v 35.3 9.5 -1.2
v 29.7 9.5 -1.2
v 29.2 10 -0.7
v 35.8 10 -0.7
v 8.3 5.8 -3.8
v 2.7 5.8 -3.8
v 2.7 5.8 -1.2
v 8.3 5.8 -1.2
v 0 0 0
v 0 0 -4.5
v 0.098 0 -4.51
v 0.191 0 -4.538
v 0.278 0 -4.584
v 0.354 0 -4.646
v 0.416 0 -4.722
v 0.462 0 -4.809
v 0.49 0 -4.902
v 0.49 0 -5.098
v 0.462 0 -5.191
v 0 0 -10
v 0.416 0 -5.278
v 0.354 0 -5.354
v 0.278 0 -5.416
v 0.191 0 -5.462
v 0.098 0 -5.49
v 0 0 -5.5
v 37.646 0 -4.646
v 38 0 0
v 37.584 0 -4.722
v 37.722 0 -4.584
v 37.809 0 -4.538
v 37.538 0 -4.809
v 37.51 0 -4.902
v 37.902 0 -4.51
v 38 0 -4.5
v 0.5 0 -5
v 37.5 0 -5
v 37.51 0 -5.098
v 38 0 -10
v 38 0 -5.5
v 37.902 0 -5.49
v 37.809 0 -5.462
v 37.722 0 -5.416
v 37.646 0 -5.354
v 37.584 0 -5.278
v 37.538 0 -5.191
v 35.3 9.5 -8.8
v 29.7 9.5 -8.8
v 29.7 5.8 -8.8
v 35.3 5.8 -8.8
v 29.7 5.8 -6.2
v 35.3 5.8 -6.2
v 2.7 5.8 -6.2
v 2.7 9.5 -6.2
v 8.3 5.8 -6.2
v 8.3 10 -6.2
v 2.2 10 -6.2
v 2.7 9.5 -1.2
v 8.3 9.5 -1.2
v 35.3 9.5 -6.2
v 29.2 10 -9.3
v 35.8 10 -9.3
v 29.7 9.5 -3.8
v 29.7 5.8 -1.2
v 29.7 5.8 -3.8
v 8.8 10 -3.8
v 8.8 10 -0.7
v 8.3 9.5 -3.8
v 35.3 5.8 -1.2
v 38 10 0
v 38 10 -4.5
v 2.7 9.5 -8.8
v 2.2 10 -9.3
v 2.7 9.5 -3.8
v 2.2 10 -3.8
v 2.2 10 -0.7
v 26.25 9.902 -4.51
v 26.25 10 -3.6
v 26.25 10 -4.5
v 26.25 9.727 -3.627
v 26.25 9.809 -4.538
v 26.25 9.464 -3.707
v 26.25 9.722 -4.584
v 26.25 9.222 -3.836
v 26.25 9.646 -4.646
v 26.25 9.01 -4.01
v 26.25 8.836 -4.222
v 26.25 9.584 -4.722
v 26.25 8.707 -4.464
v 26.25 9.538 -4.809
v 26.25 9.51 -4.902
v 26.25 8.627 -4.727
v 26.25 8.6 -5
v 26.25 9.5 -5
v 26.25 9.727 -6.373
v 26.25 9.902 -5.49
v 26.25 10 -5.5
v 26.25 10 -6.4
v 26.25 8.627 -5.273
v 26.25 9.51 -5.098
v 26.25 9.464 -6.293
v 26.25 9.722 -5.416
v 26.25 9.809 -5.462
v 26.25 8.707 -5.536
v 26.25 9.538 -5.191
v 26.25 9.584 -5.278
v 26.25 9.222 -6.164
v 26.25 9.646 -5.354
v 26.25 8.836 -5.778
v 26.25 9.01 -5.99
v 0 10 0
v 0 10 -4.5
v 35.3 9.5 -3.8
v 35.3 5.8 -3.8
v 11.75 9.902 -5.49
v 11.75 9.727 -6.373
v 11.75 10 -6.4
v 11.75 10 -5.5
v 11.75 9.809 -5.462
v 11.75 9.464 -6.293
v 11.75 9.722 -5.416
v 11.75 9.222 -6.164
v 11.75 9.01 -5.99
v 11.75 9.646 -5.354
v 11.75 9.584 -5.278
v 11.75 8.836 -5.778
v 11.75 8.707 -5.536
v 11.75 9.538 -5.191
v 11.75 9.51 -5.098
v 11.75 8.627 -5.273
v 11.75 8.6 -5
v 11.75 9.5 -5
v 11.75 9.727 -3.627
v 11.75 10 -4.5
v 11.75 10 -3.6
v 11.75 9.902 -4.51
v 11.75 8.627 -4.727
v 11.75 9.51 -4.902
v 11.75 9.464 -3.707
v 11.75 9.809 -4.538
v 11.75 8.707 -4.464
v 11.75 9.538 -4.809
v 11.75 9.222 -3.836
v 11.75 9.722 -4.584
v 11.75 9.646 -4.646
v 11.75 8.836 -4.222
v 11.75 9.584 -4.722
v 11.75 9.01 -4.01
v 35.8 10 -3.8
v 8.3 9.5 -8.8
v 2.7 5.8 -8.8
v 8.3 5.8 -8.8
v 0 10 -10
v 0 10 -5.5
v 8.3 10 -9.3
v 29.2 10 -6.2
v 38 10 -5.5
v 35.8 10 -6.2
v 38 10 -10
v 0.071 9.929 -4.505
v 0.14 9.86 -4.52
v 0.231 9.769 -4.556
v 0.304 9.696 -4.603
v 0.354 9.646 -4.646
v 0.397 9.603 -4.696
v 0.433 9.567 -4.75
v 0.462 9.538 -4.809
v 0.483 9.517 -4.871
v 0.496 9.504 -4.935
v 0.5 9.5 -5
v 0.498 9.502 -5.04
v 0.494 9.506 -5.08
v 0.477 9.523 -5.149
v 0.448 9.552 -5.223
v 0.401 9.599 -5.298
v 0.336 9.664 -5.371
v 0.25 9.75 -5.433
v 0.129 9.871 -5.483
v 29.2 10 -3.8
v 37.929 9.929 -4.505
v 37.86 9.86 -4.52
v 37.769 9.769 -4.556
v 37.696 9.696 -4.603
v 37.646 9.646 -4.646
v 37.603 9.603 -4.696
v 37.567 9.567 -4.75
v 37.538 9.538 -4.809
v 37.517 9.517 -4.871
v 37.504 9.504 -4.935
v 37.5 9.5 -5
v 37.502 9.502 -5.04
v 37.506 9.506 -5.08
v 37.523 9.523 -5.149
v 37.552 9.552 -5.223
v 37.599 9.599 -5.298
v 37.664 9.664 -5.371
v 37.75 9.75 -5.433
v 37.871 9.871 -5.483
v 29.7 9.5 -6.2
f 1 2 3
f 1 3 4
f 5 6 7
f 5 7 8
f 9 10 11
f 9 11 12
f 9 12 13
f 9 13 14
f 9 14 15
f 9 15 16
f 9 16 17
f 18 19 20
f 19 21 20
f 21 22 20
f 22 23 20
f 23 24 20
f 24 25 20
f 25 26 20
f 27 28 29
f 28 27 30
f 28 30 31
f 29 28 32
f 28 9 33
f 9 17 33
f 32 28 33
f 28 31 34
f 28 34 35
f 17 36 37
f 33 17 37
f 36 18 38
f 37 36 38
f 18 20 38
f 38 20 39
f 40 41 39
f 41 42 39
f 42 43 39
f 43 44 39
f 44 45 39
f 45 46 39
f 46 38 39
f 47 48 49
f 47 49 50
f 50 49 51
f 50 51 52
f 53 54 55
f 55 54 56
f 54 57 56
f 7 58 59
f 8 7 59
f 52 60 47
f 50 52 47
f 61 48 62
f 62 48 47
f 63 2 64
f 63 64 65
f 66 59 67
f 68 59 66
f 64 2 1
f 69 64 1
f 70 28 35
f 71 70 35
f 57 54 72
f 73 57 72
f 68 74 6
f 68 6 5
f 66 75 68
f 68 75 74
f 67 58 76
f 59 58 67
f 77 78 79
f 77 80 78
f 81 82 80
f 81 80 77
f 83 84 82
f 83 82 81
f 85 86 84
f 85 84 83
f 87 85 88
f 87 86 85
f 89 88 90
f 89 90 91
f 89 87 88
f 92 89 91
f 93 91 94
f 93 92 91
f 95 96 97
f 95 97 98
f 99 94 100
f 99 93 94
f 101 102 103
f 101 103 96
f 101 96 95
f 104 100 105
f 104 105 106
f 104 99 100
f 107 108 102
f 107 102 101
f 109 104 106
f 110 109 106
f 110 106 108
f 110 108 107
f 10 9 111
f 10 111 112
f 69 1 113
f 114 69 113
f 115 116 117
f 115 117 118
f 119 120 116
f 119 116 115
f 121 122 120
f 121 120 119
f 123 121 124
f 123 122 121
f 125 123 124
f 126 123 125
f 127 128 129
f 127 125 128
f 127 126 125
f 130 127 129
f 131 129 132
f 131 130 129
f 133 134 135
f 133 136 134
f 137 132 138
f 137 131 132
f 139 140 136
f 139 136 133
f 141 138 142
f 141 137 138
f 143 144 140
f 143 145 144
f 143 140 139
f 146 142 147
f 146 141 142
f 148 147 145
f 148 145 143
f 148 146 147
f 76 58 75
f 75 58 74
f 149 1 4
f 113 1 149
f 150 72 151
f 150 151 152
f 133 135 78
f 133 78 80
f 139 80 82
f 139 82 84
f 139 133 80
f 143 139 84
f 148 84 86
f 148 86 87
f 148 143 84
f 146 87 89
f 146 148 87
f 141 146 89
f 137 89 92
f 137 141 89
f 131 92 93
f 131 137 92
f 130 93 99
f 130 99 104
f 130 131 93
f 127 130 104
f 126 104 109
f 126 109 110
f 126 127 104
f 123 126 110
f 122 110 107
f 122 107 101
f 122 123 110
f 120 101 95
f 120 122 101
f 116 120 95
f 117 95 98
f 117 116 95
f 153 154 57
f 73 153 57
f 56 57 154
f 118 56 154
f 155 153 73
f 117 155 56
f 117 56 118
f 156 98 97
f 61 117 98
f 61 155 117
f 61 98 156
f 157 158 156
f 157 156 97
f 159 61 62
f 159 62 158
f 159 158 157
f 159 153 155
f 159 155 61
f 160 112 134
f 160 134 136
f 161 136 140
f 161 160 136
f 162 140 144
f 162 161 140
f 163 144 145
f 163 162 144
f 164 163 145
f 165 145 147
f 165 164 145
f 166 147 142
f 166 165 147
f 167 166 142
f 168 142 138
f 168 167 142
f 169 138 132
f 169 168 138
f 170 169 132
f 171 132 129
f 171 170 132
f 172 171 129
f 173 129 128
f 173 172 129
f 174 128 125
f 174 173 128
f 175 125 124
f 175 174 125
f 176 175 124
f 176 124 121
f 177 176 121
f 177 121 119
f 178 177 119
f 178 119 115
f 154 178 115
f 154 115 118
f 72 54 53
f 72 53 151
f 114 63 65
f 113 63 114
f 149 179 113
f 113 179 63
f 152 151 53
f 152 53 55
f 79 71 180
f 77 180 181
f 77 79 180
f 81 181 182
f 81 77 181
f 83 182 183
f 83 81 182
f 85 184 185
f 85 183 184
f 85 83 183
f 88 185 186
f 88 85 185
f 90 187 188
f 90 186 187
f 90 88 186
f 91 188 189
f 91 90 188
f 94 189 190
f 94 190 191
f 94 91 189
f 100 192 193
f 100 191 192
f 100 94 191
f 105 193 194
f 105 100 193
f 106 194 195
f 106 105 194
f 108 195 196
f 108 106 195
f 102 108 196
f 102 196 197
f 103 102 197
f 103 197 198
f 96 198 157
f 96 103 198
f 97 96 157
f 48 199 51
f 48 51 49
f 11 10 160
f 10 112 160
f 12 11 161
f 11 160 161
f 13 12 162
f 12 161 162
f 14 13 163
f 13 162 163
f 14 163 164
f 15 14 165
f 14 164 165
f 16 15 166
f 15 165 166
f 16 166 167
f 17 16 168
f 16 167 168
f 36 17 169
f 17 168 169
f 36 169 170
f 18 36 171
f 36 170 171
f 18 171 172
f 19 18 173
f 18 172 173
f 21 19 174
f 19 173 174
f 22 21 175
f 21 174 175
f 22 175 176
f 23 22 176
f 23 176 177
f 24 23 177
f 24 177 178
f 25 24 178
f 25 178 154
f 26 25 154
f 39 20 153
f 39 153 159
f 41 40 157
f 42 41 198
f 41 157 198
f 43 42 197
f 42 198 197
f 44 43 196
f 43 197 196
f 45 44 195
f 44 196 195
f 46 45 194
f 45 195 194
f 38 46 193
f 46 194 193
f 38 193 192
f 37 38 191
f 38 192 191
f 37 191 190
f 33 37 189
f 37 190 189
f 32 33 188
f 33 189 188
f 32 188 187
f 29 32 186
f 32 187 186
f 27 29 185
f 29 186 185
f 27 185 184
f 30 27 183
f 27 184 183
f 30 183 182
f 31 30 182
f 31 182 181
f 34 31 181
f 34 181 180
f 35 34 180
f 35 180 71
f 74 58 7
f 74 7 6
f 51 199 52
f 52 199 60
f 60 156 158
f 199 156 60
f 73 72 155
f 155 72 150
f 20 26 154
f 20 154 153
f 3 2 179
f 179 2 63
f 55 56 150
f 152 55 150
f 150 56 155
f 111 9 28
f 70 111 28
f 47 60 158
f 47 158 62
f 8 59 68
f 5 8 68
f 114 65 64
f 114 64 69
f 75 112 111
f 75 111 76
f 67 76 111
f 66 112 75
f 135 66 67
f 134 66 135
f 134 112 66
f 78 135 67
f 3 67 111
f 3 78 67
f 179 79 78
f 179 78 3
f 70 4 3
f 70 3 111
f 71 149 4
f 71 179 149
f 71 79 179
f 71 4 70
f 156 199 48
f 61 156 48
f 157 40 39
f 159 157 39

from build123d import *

# Parameters (mm, degrees)
SKETCH1_W           = 38
SKETCH1_H           = 10
BOSS_EXTRUDE1_DEPTH = 10
SKETCH3_R           = 0.5
CUT_EXTRUDE1_DEPTH  = 41.546269865
SKETCH4_W           = 5.6
SKETCH4_H           = 2.6
CUT_EXTRUDE2_DEPTH  = 4.2
CHAMFER1_SIZE       = 0.5


with BuildPart() as part:
    # Sketch1 → Boss-Extrude1 (new body)
    with BuildSketch(Plane(origin=(0, 0, 0), x_dir=(1, 0, 0), z_dir=(0, 1, 0))):
        with Locations((19, 5)):
            Rectangle(SKETCH1_W, SKETCH1_H)
    extrude(amount=BOSS_EXTRUDE1_DEPTH)

    # Sketch2 → Cut-Revolve1 (revolve, cut)
    with BuildSketch(Plane(origin=(0, 10, 0), x_dir=(1, 0, 0), z_dir=(0, 1, 0))):
        Polygon((0, 5), (38, 5), (38, 4.5), (26.25, 4.5), (26.25, 3.6), (11.75, 3.6), (11.75, 4.5), (0, 4.5), align=None)
    revolve(axis=Axis((0, 10, -5), (1, 0, 0)), mode=Mode.SUBTRACT)

    # Sketch3 → Cut-Extrude1 (cut, through all)
    with BuildSketch(Plane(origin=(0, 10, 0), x_dir=(1, 0, 0), z_dir=(0, 1, 0))):
        with Locations((0, 5)):
            Circle(SKETCH3_R)
        with Locations((38, 5)):
            Circle(SKETCH3_R)
    extrude(amount=-CUT_EXTRUDE1_DEPTH, mode=Mode.SUBTRACT)

    # Sketch4 → Cut-Extrude2 (cut)
    with BuildSketch(Plane(origin=(0, 10, 0), x_dir=(1, 0, 0), z_dir=(0, 1, 0))):
        with Locations((5.5, 7.5)):
            Rectangle(SKETCH4_W, SKETCH4_H)
        with Locations((5.5, 2.5)):
            Rectangle(SKETCH4_W, SKETCH4_H)
        with Locations((32.5, 7.5)):
            Rectangle(SKETCH4_W, SKETCH4_H)
        with Locations((32.5, 2.5)):
            Rectangle(SKETCH4_W, SKETCH4_H)
    extrude(amount=-CUT_EXTRUDE2_DEPTH, mode=Mode.SUBTRACT)

    # Chamfer1
    chamfer1_edges = [part.edges().sort_by_distance(p)[0] for p in [
        (35.3, 10, -2.5),
        (32.5, 10, -1.2),
        (29.7, 10, -2.5),
        (35.3, 10, -7.5),
        (29.7, 10, -7.5),
        (32.5, 10, -8.8),
        (8.3, 10, -2.5),
        (5.5, 10, -1.2),
        (2.7, 10, -2.5),
        (2.7, 10, -7.5),
        (5.5, 10, -8.8),
    ]]
    chamfer(chamfer1_edges, length=CHAMFER1_SIZE)


solid = part.part
